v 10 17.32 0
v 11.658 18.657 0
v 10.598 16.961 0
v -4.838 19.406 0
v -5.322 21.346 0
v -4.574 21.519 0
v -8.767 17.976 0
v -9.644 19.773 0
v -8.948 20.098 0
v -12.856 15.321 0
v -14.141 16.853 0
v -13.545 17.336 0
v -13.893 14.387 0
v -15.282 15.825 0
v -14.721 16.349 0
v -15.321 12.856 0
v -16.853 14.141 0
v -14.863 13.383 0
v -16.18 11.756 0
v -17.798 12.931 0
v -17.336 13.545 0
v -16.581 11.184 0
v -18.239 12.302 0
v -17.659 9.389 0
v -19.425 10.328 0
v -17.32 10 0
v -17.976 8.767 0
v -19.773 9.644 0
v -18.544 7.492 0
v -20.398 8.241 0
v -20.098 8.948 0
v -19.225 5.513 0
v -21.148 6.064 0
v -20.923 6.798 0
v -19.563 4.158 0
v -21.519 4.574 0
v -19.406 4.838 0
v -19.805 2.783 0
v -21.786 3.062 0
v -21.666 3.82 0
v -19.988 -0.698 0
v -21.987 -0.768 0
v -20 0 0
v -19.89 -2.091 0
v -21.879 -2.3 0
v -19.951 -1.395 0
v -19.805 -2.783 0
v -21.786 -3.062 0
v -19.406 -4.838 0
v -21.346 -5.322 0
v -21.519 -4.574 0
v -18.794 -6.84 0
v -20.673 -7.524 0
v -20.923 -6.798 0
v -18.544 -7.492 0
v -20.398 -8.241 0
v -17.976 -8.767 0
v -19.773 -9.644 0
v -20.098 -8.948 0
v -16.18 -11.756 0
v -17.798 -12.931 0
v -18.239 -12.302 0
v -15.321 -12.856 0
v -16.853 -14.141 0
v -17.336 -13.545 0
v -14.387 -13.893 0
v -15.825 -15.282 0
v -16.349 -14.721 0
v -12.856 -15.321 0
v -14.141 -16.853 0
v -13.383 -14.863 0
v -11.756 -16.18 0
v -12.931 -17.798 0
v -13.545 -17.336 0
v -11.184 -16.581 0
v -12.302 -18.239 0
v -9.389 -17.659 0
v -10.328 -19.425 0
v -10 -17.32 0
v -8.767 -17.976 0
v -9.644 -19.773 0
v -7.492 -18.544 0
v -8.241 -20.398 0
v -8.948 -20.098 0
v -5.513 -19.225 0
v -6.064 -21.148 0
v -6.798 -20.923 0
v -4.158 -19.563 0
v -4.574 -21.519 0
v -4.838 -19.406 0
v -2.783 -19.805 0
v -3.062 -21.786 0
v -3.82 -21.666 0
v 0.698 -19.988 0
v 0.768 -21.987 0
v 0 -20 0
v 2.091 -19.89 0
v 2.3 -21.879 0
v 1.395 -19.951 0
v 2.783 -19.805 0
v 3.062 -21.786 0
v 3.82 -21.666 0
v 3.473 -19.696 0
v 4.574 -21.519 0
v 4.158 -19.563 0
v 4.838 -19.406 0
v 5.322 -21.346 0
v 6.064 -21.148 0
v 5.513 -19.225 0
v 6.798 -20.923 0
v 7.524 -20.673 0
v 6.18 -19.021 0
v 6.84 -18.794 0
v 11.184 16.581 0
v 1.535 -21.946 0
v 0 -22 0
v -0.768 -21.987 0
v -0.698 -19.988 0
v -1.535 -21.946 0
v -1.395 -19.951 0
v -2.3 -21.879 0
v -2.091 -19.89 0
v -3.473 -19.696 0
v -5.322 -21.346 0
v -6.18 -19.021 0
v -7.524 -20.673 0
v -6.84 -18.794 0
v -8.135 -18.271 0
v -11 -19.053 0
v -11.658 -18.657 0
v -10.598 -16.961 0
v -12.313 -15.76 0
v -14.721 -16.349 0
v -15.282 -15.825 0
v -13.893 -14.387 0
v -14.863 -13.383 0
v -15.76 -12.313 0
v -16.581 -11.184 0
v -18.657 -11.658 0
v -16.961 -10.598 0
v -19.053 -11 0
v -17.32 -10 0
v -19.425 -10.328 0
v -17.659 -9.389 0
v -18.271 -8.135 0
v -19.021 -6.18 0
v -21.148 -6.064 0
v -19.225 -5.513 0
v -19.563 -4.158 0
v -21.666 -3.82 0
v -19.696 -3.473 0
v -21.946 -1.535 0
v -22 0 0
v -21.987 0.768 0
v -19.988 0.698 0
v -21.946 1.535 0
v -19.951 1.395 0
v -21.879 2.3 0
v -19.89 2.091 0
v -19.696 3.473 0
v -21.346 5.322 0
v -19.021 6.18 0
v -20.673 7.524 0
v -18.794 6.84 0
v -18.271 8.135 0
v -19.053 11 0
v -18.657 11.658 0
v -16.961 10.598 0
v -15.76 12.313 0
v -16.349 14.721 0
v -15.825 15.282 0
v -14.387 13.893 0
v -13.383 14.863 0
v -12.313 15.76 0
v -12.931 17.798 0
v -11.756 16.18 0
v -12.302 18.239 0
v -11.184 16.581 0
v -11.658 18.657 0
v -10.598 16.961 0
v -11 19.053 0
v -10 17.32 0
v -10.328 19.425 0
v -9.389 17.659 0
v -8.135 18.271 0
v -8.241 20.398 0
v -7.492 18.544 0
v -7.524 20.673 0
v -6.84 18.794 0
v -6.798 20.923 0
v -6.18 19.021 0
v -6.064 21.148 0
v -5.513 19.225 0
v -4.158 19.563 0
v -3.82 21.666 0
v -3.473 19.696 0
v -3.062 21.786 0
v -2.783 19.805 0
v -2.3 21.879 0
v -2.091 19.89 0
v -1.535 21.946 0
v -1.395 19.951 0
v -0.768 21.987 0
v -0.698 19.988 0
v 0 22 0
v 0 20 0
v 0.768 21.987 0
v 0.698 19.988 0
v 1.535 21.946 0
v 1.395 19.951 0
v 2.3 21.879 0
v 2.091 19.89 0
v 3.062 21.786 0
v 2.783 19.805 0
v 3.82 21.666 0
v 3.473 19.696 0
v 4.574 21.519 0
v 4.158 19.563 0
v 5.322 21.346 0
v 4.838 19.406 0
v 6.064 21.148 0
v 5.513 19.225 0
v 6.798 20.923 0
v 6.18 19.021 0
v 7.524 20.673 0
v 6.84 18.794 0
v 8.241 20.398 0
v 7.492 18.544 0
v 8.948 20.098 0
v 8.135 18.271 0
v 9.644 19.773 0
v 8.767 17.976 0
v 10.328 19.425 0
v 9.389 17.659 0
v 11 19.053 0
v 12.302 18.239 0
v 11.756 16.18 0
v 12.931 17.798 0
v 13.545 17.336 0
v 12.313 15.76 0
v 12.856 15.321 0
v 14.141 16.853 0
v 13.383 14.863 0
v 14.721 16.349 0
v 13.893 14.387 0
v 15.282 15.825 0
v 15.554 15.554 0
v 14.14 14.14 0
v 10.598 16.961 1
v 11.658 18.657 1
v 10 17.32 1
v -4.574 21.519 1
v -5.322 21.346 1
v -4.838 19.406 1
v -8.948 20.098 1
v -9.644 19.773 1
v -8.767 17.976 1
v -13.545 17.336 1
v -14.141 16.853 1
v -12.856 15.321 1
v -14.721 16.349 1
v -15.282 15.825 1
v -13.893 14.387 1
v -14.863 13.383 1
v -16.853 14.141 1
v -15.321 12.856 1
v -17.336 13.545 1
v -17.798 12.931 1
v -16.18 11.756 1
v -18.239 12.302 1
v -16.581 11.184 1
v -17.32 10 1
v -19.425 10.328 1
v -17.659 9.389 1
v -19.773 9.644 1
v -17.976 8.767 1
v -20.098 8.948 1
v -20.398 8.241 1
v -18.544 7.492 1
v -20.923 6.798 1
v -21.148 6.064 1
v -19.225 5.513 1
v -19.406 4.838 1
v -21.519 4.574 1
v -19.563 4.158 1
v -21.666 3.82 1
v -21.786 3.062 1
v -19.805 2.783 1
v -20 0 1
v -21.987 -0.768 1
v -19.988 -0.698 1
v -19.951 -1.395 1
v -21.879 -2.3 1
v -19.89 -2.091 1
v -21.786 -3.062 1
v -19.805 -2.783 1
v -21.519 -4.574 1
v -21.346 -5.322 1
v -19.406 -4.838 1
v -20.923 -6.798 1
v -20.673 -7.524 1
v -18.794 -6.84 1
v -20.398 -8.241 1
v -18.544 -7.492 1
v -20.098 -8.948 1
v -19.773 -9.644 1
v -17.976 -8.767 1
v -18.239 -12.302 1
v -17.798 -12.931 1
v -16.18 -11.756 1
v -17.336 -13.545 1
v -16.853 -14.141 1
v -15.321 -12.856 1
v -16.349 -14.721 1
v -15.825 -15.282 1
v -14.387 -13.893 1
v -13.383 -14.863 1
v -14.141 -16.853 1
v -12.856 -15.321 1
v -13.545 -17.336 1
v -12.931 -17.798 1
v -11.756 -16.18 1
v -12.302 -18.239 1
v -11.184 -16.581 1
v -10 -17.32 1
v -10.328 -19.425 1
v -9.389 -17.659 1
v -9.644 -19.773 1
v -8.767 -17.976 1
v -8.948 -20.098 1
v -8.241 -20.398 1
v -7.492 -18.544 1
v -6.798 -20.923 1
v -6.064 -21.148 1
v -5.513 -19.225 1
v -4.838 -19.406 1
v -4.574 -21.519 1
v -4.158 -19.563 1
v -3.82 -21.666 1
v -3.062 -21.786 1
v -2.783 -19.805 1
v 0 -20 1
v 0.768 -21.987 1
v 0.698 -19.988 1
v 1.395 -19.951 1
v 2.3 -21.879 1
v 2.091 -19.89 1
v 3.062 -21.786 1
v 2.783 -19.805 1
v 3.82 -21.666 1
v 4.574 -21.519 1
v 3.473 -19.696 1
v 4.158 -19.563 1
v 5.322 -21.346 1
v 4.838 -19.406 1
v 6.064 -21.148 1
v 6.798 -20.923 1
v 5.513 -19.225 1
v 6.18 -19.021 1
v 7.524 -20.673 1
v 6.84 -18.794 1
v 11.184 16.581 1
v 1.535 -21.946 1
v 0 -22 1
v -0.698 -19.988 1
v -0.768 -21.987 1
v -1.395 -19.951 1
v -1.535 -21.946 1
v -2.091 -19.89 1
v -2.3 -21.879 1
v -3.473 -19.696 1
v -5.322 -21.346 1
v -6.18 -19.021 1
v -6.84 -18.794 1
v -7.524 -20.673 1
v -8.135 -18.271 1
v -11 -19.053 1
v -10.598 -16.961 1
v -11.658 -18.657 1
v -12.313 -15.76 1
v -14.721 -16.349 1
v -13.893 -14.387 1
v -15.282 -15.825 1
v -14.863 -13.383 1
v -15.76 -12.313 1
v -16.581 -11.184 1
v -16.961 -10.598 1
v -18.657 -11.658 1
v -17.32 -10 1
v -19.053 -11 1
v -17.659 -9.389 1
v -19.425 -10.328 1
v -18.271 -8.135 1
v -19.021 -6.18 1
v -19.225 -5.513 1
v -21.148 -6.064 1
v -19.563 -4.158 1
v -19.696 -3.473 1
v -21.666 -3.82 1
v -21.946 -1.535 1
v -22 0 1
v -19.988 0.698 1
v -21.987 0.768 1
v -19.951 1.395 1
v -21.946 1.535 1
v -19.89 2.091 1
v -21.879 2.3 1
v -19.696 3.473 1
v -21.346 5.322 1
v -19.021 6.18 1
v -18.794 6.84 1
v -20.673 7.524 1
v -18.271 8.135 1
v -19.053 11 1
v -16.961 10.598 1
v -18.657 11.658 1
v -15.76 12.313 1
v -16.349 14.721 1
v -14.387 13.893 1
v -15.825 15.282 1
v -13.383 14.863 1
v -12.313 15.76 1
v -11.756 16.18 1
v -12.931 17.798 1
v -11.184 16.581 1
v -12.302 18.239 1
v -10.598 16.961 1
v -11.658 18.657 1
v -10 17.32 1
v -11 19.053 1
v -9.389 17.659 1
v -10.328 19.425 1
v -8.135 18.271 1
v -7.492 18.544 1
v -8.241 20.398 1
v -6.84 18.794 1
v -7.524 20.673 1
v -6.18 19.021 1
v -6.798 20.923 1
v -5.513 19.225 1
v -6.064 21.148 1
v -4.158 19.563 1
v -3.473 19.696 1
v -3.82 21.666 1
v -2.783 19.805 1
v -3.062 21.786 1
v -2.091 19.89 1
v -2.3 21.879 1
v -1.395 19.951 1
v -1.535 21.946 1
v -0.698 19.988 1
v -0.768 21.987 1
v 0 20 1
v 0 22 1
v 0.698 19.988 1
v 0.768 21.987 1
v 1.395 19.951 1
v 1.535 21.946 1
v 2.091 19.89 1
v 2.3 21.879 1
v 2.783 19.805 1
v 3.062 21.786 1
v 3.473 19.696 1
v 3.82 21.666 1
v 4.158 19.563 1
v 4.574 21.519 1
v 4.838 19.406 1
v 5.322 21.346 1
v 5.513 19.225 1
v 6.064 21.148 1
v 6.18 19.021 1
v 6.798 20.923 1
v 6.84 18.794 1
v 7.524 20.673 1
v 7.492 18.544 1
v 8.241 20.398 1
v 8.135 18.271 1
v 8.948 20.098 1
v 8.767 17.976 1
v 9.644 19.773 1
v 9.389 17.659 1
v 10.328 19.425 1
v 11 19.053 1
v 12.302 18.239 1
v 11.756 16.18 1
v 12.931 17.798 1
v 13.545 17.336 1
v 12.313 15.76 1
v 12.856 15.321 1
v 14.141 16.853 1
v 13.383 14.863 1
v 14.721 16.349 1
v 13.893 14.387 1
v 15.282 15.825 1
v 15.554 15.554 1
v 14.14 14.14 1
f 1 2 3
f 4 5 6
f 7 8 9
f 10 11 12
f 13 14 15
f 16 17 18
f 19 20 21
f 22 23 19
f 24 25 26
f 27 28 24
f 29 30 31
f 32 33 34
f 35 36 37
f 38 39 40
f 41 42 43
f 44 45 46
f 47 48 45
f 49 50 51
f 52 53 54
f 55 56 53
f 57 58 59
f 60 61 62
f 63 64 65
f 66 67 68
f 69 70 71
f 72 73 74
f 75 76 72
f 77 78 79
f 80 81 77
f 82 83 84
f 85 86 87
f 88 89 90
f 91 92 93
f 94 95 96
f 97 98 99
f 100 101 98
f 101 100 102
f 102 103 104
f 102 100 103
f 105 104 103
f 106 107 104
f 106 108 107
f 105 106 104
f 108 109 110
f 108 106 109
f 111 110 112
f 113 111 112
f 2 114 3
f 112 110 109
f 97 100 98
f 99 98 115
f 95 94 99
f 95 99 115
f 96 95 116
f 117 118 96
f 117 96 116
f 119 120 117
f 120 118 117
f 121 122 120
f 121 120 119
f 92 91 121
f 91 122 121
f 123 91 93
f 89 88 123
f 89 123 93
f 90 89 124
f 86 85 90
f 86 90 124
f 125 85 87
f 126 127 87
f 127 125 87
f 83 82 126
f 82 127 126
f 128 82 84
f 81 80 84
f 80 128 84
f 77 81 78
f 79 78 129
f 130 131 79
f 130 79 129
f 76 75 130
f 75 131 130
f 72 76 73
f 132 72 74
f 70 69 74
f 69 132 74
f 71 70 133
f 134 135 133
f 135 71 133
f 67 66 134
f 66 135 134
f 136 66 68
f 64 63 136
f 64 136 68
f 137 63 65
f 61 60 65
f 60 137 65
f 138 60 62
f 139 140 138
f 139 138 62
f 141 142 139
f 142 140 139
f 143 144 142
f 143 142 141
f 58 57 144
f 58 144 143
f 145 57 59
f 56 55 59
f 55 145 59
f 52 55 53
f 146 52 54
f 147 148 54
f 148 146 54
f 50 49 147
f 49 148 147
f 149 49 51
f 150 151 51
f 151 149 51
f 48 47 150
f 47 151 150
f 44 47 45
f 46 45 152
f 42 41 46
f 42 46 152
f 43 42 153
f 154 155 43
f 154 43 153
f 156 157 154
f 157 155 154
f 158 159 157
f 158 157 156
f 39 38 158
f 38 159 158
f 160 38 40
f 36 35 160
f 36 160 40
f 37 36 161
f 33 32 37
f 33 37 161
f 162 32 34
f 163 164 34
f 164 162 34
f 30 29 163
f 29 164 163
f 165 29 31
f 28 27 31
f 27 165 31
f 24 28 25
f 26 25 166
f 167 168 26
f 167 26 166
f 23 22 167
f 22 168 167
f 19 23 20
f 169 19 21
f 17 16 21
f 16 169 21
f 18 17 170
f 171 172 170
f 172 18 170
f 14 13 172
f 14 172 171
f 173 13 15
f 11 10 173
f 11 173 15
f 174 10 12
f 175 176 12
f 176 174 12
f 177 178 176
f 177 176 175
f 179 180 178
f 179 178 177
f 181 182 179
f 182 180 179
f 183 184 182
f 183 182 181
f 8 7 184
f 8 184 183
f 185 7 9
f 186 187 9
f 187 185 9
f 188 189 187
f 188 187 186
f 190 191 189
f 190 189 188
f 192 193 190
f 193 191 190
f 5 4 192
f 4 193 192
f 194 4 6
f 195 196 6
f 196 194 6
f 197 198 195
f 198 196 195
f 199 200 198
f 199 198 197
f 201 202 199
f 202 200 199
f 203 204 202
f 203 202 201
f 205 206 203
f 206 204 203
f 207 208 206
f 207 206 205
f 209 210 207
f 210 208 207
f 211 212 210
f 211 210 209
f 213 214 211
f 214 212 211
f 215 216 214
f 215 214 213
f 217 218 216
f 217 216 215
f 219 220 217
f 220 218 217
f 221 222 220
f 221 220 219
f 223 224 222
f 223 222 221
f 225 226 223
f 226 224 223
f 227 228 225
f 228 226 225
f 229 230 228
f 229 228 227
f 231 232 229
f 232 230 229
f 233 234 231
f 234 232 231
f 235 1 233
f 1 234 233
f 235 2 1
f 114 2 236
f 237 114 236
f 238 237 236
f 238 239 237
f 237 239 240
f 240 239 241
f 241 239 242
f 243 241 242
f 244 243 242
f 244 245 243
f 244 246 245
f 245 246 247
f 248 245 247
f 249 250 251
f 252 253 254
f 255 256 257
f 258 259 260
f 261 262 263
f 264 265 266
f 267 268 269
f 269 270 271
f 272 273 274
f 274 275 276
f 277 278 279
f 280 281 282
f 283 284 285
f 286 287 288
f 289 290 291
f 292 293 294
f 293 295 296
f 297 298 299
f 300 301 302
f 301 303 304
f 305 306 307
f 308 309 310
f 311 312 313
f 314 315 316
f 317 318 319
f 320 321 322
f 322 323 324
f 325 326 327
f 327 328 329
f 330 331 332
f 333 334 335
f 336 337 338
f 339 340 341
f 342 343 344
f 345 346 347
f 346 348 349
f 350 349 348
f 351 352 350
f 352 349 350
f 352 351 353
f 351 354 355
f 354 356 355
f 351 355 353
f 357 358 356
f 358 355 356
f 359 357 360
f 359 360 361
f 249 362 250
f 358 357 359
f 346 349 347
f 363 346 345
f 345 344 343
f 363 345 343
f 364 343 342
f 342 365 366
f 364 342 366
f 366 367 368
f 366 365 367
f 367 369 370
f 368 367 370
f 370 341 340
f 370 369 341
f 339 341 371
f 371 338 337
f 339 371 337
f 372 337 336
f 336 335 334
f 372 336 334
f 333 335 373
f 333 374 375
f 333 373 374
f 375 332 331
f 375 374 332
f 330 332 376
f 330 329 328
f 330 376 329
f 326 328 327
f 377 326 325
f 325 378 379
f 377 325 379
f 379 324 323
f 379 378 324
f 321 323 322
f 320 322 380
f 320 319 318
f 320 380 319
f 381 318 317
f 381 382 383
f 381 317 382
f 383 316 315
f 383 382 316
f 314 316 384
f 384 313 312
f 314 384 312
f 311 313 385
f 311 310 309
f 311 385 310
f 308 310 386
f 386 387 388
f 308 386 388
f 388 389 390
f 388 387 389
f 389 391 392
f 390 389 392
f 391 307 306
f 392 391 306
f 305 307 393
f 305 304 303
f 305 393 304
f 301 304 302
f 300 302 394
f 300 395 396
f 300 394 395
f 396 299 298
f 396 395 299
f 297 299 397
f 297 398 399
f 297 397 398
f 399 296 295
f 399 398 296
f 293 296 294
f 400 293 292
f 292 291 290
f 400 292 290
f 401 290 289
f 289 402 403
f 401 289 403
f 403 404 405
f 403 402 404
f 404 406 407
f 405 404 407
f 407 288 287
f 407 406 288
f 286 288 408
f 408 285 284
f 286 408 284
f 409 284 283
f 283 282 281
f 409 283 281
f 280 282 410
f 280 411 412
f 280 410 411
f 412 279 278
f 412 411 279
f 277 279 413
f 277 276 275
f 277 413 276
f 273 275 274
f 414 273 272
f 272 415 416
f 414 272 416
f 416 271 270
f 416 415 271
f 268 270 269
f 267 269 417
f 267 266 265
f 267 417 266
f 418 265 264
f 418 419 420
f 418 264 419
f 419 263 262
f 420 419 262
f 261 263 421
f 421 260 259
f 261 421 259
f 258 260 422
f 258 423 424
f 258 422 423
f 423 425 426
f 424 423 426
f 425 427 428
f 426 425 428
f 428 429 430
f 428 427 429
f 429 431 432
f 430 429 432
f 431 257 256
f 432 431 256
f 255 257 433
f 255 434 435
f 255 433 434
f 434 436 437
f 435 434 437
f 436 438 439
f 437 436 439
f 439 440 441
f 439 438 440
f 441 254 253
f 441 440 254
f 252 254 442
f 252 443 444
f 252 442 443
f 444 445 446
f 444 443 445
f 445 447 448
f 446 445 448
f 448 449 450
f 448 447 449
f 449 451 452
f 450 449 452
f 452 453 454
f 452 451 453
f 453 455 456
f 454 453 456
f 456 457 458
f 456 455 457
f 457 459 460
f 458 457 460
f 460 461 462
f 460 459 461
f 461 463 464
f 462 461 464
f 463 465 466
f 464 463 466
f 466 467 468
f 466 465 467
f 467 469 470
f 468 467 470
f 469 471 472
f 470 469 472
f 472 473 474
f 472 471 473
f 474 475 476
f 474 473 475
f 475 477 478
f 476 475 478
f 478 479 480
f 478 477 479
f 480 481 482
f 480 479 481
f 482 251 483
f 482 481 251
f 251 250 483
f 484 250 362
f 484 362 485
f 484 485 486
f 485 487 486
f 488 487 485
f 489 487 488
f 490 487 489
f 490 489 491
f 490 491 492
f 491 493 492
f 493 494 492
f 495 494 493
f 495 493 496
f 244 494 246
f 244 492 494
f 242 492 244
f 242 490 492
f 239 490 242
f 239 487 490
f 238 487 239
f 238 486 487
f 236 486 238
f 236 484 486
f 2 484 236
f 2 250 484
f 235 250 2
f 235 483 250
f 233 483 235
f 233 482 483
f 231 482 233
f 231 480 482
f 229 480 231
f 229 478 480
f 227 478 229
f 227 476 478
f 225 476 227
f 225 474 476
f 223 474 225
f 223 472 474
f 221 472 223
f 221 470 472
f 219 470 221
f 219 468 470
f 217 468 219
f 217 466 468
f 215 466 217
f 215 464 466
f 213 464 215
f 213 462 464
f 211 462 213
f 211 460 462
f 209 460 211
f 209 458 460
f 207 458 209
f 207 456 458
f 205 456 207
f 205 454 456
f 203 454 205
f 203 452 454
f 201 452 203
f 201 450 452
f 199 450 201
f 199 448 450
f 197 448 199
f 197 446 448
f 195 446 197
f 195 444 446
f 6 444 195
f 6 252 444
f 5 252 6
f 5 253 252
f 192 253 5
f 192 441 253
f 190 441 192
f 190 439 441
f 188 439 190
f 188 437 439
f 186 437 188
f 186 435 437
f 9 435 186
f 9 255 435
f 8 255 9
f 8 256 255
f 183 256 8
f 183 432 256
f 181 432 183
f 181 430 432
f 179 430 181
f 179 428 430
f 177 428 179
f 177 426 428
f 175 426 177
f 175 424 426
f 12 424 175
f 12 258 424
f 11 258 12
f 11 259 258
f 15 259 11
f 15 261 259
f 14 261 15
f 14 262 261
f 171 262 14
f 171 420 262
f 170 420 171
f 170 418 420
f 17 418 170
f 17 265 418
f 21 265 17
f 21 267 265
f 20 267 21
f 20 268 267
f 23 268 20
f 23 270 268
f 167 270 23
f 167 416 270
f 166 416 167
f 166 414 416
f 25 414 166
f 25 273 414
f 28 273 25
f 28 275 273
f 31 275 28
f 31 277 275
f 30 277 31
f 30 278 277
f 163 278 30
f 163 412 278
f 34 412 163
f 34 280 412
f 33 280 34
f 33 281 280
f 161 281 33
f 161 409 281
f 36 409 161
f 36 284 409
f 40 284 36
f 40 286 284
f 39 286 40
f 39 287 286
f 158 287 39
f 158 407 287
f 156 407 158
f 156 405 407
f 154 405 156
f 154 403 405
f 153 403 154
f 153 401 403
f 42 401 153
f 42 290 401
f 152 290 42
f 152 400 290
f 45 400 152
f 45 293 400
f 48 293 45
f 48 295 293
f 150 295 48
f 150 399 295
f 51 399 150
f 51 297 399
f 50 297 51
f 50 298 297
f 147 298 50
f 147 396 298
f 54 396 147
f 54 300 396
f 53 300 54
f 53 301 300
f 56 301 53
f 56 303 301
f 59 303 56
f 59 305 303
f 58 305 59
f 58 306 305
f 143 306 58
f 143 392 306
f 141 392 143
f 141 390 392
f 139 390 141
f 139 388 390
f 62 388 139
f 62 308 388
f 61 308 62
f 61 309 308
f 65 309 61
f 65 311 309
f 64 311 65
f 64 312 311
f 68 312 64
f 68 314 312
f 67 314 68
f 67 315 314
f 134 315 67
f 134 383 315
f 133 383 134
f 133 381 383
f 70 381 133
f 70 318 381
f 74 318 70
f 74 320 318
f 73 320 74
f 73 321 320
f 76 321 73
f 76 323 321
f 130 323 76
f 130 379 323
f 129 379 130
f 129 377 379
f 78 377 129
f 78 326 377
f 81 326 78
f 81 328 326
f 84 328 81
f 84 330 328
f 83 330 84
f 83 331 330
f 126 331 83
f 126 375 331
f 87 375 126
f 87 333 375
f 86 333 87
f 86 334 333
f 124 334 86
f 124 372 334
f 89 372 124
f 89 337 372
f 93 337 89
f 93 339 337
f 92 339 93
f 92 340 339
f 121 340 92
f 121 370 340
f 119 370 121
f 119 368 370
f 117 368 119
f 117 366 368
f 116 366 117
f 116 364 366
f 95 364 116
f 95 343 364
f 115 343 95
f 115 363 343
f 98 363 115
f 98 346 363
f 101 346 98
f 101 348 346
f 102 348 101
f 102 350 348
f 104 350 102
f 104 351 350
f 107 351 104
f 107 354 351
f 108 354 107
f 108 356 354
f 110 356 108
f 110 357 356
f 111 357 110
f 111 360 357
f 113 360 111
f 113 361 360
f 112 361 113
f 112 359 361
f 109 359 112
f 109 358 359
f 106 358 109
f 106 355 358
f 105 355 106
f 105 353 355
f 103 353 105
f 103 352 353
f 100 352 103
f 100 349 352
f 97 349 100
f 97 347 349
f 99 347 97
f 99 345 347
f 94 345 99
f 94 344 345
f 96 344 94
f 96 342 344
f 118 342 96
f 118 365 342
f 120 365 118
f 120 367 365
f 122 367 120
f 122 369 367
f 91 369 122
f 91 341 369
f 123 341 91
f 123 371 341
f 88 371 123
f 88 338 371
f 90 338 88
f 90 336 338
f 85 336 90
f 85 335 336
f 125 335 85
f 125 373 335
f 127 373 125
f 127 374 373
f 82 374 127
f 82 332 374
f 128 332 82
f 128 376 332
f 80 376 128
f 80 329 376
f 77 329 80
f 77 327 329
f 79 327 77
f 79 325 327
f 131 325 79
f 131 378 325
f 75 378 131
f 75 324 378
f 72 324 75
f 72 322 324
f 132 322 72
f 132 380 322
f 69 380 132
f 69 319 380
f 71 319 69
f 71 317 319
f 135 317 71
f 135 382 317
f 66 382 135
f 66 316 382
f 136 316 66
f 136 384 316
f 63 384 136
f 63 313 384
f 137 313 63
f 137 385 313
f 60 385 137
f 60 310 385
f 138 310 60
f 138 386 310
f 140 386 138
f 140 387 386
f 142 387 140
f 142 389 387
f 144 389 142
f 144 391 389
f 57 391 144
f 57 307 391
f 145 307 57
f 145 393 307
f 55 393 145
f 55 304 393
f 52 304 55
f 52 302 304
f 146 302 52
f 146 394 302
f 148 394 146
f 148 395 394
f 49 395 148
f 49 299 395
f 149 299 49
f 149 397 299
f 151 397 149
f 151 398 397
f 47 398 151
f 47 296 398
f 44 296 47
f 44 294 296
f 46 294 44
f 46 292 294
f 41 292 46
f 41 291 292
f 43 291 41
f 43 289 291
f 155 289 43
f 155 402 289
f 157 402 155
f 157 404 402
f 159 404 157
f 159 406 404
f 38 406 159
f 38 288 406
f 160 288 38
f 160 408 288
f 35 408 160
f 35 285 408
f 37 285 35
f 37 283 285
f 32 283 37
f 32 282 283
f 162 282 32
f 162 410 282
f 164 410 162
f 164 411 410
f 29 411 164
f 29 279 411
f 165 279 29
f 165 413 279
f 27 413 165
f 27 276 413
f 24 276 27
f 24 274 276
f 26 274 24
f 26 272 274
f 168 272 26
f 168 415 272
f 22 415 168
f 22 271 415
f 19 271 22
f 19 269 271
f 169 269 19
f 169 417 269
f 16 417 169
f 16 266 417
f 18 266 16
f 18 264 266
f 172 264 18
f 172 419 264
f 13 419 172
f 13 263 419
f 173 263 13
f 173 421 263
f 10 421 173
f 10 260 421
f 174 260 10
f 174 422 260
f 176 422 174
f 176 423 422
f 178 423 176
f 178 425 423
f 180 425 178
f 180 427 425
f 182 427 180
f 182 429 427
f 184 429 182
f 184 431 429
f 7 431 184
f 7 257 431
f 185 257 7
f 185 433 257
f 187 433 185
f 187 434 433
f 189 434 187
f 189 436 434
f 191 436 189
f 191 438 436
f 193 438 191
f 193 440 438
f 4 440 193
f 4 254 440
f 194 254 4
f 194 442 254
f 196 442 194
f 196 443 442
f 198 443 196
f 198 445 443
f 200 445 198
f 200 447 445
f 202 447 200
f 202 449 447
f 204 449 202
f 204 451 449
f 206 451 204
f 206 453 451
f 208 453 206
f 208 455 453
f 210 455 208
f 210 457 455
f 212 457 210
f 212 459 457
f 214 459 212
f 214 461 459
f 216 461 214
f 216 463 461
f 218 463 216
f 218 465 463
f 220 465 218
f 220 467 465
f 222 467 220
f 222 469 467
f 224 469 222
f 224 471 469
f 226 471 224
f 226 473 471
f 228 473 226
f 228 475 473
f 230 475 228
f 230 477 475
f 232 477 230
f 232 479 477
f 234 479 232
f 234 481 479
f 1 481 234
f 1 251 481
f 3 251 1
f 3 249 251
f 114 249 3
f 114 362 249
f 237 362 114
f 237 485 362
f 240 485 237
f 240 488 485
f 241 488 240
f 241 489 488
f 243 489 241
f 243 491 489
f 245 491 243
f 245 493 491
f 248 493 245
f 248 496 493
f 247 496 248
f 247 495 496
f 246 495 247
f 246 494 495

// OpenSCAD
// Kabelklemme

radius = 20;
angles = [45, 290];
width = 2;
fn = 180;

module sector(radius, angles, fn = fn) {
    r = radius / cos(180 / fn);
    step = -360 / fn;

    points = concat([[0, 0]],
        [for(a = [angles[0] : step : angles[1] - 361]) 
            [r * cos(a), r * sin(a)]
        ],
        [[r * cos(angles[1]), r * sin(angles[1])]]
    );

    difference() {
        circle(radius, $fn = fn);
        polygon(points);
    }
}

module arc(radius, angles, width = 1, fn = fn) {
    difference() {
        sector(radius + width, angles, fn);
        sector(radius, angles, fn);
    }
} 

module klemme() {
    linear_extrude(1) {
        arc(radius, angles, width);
    }
}

klemme();
